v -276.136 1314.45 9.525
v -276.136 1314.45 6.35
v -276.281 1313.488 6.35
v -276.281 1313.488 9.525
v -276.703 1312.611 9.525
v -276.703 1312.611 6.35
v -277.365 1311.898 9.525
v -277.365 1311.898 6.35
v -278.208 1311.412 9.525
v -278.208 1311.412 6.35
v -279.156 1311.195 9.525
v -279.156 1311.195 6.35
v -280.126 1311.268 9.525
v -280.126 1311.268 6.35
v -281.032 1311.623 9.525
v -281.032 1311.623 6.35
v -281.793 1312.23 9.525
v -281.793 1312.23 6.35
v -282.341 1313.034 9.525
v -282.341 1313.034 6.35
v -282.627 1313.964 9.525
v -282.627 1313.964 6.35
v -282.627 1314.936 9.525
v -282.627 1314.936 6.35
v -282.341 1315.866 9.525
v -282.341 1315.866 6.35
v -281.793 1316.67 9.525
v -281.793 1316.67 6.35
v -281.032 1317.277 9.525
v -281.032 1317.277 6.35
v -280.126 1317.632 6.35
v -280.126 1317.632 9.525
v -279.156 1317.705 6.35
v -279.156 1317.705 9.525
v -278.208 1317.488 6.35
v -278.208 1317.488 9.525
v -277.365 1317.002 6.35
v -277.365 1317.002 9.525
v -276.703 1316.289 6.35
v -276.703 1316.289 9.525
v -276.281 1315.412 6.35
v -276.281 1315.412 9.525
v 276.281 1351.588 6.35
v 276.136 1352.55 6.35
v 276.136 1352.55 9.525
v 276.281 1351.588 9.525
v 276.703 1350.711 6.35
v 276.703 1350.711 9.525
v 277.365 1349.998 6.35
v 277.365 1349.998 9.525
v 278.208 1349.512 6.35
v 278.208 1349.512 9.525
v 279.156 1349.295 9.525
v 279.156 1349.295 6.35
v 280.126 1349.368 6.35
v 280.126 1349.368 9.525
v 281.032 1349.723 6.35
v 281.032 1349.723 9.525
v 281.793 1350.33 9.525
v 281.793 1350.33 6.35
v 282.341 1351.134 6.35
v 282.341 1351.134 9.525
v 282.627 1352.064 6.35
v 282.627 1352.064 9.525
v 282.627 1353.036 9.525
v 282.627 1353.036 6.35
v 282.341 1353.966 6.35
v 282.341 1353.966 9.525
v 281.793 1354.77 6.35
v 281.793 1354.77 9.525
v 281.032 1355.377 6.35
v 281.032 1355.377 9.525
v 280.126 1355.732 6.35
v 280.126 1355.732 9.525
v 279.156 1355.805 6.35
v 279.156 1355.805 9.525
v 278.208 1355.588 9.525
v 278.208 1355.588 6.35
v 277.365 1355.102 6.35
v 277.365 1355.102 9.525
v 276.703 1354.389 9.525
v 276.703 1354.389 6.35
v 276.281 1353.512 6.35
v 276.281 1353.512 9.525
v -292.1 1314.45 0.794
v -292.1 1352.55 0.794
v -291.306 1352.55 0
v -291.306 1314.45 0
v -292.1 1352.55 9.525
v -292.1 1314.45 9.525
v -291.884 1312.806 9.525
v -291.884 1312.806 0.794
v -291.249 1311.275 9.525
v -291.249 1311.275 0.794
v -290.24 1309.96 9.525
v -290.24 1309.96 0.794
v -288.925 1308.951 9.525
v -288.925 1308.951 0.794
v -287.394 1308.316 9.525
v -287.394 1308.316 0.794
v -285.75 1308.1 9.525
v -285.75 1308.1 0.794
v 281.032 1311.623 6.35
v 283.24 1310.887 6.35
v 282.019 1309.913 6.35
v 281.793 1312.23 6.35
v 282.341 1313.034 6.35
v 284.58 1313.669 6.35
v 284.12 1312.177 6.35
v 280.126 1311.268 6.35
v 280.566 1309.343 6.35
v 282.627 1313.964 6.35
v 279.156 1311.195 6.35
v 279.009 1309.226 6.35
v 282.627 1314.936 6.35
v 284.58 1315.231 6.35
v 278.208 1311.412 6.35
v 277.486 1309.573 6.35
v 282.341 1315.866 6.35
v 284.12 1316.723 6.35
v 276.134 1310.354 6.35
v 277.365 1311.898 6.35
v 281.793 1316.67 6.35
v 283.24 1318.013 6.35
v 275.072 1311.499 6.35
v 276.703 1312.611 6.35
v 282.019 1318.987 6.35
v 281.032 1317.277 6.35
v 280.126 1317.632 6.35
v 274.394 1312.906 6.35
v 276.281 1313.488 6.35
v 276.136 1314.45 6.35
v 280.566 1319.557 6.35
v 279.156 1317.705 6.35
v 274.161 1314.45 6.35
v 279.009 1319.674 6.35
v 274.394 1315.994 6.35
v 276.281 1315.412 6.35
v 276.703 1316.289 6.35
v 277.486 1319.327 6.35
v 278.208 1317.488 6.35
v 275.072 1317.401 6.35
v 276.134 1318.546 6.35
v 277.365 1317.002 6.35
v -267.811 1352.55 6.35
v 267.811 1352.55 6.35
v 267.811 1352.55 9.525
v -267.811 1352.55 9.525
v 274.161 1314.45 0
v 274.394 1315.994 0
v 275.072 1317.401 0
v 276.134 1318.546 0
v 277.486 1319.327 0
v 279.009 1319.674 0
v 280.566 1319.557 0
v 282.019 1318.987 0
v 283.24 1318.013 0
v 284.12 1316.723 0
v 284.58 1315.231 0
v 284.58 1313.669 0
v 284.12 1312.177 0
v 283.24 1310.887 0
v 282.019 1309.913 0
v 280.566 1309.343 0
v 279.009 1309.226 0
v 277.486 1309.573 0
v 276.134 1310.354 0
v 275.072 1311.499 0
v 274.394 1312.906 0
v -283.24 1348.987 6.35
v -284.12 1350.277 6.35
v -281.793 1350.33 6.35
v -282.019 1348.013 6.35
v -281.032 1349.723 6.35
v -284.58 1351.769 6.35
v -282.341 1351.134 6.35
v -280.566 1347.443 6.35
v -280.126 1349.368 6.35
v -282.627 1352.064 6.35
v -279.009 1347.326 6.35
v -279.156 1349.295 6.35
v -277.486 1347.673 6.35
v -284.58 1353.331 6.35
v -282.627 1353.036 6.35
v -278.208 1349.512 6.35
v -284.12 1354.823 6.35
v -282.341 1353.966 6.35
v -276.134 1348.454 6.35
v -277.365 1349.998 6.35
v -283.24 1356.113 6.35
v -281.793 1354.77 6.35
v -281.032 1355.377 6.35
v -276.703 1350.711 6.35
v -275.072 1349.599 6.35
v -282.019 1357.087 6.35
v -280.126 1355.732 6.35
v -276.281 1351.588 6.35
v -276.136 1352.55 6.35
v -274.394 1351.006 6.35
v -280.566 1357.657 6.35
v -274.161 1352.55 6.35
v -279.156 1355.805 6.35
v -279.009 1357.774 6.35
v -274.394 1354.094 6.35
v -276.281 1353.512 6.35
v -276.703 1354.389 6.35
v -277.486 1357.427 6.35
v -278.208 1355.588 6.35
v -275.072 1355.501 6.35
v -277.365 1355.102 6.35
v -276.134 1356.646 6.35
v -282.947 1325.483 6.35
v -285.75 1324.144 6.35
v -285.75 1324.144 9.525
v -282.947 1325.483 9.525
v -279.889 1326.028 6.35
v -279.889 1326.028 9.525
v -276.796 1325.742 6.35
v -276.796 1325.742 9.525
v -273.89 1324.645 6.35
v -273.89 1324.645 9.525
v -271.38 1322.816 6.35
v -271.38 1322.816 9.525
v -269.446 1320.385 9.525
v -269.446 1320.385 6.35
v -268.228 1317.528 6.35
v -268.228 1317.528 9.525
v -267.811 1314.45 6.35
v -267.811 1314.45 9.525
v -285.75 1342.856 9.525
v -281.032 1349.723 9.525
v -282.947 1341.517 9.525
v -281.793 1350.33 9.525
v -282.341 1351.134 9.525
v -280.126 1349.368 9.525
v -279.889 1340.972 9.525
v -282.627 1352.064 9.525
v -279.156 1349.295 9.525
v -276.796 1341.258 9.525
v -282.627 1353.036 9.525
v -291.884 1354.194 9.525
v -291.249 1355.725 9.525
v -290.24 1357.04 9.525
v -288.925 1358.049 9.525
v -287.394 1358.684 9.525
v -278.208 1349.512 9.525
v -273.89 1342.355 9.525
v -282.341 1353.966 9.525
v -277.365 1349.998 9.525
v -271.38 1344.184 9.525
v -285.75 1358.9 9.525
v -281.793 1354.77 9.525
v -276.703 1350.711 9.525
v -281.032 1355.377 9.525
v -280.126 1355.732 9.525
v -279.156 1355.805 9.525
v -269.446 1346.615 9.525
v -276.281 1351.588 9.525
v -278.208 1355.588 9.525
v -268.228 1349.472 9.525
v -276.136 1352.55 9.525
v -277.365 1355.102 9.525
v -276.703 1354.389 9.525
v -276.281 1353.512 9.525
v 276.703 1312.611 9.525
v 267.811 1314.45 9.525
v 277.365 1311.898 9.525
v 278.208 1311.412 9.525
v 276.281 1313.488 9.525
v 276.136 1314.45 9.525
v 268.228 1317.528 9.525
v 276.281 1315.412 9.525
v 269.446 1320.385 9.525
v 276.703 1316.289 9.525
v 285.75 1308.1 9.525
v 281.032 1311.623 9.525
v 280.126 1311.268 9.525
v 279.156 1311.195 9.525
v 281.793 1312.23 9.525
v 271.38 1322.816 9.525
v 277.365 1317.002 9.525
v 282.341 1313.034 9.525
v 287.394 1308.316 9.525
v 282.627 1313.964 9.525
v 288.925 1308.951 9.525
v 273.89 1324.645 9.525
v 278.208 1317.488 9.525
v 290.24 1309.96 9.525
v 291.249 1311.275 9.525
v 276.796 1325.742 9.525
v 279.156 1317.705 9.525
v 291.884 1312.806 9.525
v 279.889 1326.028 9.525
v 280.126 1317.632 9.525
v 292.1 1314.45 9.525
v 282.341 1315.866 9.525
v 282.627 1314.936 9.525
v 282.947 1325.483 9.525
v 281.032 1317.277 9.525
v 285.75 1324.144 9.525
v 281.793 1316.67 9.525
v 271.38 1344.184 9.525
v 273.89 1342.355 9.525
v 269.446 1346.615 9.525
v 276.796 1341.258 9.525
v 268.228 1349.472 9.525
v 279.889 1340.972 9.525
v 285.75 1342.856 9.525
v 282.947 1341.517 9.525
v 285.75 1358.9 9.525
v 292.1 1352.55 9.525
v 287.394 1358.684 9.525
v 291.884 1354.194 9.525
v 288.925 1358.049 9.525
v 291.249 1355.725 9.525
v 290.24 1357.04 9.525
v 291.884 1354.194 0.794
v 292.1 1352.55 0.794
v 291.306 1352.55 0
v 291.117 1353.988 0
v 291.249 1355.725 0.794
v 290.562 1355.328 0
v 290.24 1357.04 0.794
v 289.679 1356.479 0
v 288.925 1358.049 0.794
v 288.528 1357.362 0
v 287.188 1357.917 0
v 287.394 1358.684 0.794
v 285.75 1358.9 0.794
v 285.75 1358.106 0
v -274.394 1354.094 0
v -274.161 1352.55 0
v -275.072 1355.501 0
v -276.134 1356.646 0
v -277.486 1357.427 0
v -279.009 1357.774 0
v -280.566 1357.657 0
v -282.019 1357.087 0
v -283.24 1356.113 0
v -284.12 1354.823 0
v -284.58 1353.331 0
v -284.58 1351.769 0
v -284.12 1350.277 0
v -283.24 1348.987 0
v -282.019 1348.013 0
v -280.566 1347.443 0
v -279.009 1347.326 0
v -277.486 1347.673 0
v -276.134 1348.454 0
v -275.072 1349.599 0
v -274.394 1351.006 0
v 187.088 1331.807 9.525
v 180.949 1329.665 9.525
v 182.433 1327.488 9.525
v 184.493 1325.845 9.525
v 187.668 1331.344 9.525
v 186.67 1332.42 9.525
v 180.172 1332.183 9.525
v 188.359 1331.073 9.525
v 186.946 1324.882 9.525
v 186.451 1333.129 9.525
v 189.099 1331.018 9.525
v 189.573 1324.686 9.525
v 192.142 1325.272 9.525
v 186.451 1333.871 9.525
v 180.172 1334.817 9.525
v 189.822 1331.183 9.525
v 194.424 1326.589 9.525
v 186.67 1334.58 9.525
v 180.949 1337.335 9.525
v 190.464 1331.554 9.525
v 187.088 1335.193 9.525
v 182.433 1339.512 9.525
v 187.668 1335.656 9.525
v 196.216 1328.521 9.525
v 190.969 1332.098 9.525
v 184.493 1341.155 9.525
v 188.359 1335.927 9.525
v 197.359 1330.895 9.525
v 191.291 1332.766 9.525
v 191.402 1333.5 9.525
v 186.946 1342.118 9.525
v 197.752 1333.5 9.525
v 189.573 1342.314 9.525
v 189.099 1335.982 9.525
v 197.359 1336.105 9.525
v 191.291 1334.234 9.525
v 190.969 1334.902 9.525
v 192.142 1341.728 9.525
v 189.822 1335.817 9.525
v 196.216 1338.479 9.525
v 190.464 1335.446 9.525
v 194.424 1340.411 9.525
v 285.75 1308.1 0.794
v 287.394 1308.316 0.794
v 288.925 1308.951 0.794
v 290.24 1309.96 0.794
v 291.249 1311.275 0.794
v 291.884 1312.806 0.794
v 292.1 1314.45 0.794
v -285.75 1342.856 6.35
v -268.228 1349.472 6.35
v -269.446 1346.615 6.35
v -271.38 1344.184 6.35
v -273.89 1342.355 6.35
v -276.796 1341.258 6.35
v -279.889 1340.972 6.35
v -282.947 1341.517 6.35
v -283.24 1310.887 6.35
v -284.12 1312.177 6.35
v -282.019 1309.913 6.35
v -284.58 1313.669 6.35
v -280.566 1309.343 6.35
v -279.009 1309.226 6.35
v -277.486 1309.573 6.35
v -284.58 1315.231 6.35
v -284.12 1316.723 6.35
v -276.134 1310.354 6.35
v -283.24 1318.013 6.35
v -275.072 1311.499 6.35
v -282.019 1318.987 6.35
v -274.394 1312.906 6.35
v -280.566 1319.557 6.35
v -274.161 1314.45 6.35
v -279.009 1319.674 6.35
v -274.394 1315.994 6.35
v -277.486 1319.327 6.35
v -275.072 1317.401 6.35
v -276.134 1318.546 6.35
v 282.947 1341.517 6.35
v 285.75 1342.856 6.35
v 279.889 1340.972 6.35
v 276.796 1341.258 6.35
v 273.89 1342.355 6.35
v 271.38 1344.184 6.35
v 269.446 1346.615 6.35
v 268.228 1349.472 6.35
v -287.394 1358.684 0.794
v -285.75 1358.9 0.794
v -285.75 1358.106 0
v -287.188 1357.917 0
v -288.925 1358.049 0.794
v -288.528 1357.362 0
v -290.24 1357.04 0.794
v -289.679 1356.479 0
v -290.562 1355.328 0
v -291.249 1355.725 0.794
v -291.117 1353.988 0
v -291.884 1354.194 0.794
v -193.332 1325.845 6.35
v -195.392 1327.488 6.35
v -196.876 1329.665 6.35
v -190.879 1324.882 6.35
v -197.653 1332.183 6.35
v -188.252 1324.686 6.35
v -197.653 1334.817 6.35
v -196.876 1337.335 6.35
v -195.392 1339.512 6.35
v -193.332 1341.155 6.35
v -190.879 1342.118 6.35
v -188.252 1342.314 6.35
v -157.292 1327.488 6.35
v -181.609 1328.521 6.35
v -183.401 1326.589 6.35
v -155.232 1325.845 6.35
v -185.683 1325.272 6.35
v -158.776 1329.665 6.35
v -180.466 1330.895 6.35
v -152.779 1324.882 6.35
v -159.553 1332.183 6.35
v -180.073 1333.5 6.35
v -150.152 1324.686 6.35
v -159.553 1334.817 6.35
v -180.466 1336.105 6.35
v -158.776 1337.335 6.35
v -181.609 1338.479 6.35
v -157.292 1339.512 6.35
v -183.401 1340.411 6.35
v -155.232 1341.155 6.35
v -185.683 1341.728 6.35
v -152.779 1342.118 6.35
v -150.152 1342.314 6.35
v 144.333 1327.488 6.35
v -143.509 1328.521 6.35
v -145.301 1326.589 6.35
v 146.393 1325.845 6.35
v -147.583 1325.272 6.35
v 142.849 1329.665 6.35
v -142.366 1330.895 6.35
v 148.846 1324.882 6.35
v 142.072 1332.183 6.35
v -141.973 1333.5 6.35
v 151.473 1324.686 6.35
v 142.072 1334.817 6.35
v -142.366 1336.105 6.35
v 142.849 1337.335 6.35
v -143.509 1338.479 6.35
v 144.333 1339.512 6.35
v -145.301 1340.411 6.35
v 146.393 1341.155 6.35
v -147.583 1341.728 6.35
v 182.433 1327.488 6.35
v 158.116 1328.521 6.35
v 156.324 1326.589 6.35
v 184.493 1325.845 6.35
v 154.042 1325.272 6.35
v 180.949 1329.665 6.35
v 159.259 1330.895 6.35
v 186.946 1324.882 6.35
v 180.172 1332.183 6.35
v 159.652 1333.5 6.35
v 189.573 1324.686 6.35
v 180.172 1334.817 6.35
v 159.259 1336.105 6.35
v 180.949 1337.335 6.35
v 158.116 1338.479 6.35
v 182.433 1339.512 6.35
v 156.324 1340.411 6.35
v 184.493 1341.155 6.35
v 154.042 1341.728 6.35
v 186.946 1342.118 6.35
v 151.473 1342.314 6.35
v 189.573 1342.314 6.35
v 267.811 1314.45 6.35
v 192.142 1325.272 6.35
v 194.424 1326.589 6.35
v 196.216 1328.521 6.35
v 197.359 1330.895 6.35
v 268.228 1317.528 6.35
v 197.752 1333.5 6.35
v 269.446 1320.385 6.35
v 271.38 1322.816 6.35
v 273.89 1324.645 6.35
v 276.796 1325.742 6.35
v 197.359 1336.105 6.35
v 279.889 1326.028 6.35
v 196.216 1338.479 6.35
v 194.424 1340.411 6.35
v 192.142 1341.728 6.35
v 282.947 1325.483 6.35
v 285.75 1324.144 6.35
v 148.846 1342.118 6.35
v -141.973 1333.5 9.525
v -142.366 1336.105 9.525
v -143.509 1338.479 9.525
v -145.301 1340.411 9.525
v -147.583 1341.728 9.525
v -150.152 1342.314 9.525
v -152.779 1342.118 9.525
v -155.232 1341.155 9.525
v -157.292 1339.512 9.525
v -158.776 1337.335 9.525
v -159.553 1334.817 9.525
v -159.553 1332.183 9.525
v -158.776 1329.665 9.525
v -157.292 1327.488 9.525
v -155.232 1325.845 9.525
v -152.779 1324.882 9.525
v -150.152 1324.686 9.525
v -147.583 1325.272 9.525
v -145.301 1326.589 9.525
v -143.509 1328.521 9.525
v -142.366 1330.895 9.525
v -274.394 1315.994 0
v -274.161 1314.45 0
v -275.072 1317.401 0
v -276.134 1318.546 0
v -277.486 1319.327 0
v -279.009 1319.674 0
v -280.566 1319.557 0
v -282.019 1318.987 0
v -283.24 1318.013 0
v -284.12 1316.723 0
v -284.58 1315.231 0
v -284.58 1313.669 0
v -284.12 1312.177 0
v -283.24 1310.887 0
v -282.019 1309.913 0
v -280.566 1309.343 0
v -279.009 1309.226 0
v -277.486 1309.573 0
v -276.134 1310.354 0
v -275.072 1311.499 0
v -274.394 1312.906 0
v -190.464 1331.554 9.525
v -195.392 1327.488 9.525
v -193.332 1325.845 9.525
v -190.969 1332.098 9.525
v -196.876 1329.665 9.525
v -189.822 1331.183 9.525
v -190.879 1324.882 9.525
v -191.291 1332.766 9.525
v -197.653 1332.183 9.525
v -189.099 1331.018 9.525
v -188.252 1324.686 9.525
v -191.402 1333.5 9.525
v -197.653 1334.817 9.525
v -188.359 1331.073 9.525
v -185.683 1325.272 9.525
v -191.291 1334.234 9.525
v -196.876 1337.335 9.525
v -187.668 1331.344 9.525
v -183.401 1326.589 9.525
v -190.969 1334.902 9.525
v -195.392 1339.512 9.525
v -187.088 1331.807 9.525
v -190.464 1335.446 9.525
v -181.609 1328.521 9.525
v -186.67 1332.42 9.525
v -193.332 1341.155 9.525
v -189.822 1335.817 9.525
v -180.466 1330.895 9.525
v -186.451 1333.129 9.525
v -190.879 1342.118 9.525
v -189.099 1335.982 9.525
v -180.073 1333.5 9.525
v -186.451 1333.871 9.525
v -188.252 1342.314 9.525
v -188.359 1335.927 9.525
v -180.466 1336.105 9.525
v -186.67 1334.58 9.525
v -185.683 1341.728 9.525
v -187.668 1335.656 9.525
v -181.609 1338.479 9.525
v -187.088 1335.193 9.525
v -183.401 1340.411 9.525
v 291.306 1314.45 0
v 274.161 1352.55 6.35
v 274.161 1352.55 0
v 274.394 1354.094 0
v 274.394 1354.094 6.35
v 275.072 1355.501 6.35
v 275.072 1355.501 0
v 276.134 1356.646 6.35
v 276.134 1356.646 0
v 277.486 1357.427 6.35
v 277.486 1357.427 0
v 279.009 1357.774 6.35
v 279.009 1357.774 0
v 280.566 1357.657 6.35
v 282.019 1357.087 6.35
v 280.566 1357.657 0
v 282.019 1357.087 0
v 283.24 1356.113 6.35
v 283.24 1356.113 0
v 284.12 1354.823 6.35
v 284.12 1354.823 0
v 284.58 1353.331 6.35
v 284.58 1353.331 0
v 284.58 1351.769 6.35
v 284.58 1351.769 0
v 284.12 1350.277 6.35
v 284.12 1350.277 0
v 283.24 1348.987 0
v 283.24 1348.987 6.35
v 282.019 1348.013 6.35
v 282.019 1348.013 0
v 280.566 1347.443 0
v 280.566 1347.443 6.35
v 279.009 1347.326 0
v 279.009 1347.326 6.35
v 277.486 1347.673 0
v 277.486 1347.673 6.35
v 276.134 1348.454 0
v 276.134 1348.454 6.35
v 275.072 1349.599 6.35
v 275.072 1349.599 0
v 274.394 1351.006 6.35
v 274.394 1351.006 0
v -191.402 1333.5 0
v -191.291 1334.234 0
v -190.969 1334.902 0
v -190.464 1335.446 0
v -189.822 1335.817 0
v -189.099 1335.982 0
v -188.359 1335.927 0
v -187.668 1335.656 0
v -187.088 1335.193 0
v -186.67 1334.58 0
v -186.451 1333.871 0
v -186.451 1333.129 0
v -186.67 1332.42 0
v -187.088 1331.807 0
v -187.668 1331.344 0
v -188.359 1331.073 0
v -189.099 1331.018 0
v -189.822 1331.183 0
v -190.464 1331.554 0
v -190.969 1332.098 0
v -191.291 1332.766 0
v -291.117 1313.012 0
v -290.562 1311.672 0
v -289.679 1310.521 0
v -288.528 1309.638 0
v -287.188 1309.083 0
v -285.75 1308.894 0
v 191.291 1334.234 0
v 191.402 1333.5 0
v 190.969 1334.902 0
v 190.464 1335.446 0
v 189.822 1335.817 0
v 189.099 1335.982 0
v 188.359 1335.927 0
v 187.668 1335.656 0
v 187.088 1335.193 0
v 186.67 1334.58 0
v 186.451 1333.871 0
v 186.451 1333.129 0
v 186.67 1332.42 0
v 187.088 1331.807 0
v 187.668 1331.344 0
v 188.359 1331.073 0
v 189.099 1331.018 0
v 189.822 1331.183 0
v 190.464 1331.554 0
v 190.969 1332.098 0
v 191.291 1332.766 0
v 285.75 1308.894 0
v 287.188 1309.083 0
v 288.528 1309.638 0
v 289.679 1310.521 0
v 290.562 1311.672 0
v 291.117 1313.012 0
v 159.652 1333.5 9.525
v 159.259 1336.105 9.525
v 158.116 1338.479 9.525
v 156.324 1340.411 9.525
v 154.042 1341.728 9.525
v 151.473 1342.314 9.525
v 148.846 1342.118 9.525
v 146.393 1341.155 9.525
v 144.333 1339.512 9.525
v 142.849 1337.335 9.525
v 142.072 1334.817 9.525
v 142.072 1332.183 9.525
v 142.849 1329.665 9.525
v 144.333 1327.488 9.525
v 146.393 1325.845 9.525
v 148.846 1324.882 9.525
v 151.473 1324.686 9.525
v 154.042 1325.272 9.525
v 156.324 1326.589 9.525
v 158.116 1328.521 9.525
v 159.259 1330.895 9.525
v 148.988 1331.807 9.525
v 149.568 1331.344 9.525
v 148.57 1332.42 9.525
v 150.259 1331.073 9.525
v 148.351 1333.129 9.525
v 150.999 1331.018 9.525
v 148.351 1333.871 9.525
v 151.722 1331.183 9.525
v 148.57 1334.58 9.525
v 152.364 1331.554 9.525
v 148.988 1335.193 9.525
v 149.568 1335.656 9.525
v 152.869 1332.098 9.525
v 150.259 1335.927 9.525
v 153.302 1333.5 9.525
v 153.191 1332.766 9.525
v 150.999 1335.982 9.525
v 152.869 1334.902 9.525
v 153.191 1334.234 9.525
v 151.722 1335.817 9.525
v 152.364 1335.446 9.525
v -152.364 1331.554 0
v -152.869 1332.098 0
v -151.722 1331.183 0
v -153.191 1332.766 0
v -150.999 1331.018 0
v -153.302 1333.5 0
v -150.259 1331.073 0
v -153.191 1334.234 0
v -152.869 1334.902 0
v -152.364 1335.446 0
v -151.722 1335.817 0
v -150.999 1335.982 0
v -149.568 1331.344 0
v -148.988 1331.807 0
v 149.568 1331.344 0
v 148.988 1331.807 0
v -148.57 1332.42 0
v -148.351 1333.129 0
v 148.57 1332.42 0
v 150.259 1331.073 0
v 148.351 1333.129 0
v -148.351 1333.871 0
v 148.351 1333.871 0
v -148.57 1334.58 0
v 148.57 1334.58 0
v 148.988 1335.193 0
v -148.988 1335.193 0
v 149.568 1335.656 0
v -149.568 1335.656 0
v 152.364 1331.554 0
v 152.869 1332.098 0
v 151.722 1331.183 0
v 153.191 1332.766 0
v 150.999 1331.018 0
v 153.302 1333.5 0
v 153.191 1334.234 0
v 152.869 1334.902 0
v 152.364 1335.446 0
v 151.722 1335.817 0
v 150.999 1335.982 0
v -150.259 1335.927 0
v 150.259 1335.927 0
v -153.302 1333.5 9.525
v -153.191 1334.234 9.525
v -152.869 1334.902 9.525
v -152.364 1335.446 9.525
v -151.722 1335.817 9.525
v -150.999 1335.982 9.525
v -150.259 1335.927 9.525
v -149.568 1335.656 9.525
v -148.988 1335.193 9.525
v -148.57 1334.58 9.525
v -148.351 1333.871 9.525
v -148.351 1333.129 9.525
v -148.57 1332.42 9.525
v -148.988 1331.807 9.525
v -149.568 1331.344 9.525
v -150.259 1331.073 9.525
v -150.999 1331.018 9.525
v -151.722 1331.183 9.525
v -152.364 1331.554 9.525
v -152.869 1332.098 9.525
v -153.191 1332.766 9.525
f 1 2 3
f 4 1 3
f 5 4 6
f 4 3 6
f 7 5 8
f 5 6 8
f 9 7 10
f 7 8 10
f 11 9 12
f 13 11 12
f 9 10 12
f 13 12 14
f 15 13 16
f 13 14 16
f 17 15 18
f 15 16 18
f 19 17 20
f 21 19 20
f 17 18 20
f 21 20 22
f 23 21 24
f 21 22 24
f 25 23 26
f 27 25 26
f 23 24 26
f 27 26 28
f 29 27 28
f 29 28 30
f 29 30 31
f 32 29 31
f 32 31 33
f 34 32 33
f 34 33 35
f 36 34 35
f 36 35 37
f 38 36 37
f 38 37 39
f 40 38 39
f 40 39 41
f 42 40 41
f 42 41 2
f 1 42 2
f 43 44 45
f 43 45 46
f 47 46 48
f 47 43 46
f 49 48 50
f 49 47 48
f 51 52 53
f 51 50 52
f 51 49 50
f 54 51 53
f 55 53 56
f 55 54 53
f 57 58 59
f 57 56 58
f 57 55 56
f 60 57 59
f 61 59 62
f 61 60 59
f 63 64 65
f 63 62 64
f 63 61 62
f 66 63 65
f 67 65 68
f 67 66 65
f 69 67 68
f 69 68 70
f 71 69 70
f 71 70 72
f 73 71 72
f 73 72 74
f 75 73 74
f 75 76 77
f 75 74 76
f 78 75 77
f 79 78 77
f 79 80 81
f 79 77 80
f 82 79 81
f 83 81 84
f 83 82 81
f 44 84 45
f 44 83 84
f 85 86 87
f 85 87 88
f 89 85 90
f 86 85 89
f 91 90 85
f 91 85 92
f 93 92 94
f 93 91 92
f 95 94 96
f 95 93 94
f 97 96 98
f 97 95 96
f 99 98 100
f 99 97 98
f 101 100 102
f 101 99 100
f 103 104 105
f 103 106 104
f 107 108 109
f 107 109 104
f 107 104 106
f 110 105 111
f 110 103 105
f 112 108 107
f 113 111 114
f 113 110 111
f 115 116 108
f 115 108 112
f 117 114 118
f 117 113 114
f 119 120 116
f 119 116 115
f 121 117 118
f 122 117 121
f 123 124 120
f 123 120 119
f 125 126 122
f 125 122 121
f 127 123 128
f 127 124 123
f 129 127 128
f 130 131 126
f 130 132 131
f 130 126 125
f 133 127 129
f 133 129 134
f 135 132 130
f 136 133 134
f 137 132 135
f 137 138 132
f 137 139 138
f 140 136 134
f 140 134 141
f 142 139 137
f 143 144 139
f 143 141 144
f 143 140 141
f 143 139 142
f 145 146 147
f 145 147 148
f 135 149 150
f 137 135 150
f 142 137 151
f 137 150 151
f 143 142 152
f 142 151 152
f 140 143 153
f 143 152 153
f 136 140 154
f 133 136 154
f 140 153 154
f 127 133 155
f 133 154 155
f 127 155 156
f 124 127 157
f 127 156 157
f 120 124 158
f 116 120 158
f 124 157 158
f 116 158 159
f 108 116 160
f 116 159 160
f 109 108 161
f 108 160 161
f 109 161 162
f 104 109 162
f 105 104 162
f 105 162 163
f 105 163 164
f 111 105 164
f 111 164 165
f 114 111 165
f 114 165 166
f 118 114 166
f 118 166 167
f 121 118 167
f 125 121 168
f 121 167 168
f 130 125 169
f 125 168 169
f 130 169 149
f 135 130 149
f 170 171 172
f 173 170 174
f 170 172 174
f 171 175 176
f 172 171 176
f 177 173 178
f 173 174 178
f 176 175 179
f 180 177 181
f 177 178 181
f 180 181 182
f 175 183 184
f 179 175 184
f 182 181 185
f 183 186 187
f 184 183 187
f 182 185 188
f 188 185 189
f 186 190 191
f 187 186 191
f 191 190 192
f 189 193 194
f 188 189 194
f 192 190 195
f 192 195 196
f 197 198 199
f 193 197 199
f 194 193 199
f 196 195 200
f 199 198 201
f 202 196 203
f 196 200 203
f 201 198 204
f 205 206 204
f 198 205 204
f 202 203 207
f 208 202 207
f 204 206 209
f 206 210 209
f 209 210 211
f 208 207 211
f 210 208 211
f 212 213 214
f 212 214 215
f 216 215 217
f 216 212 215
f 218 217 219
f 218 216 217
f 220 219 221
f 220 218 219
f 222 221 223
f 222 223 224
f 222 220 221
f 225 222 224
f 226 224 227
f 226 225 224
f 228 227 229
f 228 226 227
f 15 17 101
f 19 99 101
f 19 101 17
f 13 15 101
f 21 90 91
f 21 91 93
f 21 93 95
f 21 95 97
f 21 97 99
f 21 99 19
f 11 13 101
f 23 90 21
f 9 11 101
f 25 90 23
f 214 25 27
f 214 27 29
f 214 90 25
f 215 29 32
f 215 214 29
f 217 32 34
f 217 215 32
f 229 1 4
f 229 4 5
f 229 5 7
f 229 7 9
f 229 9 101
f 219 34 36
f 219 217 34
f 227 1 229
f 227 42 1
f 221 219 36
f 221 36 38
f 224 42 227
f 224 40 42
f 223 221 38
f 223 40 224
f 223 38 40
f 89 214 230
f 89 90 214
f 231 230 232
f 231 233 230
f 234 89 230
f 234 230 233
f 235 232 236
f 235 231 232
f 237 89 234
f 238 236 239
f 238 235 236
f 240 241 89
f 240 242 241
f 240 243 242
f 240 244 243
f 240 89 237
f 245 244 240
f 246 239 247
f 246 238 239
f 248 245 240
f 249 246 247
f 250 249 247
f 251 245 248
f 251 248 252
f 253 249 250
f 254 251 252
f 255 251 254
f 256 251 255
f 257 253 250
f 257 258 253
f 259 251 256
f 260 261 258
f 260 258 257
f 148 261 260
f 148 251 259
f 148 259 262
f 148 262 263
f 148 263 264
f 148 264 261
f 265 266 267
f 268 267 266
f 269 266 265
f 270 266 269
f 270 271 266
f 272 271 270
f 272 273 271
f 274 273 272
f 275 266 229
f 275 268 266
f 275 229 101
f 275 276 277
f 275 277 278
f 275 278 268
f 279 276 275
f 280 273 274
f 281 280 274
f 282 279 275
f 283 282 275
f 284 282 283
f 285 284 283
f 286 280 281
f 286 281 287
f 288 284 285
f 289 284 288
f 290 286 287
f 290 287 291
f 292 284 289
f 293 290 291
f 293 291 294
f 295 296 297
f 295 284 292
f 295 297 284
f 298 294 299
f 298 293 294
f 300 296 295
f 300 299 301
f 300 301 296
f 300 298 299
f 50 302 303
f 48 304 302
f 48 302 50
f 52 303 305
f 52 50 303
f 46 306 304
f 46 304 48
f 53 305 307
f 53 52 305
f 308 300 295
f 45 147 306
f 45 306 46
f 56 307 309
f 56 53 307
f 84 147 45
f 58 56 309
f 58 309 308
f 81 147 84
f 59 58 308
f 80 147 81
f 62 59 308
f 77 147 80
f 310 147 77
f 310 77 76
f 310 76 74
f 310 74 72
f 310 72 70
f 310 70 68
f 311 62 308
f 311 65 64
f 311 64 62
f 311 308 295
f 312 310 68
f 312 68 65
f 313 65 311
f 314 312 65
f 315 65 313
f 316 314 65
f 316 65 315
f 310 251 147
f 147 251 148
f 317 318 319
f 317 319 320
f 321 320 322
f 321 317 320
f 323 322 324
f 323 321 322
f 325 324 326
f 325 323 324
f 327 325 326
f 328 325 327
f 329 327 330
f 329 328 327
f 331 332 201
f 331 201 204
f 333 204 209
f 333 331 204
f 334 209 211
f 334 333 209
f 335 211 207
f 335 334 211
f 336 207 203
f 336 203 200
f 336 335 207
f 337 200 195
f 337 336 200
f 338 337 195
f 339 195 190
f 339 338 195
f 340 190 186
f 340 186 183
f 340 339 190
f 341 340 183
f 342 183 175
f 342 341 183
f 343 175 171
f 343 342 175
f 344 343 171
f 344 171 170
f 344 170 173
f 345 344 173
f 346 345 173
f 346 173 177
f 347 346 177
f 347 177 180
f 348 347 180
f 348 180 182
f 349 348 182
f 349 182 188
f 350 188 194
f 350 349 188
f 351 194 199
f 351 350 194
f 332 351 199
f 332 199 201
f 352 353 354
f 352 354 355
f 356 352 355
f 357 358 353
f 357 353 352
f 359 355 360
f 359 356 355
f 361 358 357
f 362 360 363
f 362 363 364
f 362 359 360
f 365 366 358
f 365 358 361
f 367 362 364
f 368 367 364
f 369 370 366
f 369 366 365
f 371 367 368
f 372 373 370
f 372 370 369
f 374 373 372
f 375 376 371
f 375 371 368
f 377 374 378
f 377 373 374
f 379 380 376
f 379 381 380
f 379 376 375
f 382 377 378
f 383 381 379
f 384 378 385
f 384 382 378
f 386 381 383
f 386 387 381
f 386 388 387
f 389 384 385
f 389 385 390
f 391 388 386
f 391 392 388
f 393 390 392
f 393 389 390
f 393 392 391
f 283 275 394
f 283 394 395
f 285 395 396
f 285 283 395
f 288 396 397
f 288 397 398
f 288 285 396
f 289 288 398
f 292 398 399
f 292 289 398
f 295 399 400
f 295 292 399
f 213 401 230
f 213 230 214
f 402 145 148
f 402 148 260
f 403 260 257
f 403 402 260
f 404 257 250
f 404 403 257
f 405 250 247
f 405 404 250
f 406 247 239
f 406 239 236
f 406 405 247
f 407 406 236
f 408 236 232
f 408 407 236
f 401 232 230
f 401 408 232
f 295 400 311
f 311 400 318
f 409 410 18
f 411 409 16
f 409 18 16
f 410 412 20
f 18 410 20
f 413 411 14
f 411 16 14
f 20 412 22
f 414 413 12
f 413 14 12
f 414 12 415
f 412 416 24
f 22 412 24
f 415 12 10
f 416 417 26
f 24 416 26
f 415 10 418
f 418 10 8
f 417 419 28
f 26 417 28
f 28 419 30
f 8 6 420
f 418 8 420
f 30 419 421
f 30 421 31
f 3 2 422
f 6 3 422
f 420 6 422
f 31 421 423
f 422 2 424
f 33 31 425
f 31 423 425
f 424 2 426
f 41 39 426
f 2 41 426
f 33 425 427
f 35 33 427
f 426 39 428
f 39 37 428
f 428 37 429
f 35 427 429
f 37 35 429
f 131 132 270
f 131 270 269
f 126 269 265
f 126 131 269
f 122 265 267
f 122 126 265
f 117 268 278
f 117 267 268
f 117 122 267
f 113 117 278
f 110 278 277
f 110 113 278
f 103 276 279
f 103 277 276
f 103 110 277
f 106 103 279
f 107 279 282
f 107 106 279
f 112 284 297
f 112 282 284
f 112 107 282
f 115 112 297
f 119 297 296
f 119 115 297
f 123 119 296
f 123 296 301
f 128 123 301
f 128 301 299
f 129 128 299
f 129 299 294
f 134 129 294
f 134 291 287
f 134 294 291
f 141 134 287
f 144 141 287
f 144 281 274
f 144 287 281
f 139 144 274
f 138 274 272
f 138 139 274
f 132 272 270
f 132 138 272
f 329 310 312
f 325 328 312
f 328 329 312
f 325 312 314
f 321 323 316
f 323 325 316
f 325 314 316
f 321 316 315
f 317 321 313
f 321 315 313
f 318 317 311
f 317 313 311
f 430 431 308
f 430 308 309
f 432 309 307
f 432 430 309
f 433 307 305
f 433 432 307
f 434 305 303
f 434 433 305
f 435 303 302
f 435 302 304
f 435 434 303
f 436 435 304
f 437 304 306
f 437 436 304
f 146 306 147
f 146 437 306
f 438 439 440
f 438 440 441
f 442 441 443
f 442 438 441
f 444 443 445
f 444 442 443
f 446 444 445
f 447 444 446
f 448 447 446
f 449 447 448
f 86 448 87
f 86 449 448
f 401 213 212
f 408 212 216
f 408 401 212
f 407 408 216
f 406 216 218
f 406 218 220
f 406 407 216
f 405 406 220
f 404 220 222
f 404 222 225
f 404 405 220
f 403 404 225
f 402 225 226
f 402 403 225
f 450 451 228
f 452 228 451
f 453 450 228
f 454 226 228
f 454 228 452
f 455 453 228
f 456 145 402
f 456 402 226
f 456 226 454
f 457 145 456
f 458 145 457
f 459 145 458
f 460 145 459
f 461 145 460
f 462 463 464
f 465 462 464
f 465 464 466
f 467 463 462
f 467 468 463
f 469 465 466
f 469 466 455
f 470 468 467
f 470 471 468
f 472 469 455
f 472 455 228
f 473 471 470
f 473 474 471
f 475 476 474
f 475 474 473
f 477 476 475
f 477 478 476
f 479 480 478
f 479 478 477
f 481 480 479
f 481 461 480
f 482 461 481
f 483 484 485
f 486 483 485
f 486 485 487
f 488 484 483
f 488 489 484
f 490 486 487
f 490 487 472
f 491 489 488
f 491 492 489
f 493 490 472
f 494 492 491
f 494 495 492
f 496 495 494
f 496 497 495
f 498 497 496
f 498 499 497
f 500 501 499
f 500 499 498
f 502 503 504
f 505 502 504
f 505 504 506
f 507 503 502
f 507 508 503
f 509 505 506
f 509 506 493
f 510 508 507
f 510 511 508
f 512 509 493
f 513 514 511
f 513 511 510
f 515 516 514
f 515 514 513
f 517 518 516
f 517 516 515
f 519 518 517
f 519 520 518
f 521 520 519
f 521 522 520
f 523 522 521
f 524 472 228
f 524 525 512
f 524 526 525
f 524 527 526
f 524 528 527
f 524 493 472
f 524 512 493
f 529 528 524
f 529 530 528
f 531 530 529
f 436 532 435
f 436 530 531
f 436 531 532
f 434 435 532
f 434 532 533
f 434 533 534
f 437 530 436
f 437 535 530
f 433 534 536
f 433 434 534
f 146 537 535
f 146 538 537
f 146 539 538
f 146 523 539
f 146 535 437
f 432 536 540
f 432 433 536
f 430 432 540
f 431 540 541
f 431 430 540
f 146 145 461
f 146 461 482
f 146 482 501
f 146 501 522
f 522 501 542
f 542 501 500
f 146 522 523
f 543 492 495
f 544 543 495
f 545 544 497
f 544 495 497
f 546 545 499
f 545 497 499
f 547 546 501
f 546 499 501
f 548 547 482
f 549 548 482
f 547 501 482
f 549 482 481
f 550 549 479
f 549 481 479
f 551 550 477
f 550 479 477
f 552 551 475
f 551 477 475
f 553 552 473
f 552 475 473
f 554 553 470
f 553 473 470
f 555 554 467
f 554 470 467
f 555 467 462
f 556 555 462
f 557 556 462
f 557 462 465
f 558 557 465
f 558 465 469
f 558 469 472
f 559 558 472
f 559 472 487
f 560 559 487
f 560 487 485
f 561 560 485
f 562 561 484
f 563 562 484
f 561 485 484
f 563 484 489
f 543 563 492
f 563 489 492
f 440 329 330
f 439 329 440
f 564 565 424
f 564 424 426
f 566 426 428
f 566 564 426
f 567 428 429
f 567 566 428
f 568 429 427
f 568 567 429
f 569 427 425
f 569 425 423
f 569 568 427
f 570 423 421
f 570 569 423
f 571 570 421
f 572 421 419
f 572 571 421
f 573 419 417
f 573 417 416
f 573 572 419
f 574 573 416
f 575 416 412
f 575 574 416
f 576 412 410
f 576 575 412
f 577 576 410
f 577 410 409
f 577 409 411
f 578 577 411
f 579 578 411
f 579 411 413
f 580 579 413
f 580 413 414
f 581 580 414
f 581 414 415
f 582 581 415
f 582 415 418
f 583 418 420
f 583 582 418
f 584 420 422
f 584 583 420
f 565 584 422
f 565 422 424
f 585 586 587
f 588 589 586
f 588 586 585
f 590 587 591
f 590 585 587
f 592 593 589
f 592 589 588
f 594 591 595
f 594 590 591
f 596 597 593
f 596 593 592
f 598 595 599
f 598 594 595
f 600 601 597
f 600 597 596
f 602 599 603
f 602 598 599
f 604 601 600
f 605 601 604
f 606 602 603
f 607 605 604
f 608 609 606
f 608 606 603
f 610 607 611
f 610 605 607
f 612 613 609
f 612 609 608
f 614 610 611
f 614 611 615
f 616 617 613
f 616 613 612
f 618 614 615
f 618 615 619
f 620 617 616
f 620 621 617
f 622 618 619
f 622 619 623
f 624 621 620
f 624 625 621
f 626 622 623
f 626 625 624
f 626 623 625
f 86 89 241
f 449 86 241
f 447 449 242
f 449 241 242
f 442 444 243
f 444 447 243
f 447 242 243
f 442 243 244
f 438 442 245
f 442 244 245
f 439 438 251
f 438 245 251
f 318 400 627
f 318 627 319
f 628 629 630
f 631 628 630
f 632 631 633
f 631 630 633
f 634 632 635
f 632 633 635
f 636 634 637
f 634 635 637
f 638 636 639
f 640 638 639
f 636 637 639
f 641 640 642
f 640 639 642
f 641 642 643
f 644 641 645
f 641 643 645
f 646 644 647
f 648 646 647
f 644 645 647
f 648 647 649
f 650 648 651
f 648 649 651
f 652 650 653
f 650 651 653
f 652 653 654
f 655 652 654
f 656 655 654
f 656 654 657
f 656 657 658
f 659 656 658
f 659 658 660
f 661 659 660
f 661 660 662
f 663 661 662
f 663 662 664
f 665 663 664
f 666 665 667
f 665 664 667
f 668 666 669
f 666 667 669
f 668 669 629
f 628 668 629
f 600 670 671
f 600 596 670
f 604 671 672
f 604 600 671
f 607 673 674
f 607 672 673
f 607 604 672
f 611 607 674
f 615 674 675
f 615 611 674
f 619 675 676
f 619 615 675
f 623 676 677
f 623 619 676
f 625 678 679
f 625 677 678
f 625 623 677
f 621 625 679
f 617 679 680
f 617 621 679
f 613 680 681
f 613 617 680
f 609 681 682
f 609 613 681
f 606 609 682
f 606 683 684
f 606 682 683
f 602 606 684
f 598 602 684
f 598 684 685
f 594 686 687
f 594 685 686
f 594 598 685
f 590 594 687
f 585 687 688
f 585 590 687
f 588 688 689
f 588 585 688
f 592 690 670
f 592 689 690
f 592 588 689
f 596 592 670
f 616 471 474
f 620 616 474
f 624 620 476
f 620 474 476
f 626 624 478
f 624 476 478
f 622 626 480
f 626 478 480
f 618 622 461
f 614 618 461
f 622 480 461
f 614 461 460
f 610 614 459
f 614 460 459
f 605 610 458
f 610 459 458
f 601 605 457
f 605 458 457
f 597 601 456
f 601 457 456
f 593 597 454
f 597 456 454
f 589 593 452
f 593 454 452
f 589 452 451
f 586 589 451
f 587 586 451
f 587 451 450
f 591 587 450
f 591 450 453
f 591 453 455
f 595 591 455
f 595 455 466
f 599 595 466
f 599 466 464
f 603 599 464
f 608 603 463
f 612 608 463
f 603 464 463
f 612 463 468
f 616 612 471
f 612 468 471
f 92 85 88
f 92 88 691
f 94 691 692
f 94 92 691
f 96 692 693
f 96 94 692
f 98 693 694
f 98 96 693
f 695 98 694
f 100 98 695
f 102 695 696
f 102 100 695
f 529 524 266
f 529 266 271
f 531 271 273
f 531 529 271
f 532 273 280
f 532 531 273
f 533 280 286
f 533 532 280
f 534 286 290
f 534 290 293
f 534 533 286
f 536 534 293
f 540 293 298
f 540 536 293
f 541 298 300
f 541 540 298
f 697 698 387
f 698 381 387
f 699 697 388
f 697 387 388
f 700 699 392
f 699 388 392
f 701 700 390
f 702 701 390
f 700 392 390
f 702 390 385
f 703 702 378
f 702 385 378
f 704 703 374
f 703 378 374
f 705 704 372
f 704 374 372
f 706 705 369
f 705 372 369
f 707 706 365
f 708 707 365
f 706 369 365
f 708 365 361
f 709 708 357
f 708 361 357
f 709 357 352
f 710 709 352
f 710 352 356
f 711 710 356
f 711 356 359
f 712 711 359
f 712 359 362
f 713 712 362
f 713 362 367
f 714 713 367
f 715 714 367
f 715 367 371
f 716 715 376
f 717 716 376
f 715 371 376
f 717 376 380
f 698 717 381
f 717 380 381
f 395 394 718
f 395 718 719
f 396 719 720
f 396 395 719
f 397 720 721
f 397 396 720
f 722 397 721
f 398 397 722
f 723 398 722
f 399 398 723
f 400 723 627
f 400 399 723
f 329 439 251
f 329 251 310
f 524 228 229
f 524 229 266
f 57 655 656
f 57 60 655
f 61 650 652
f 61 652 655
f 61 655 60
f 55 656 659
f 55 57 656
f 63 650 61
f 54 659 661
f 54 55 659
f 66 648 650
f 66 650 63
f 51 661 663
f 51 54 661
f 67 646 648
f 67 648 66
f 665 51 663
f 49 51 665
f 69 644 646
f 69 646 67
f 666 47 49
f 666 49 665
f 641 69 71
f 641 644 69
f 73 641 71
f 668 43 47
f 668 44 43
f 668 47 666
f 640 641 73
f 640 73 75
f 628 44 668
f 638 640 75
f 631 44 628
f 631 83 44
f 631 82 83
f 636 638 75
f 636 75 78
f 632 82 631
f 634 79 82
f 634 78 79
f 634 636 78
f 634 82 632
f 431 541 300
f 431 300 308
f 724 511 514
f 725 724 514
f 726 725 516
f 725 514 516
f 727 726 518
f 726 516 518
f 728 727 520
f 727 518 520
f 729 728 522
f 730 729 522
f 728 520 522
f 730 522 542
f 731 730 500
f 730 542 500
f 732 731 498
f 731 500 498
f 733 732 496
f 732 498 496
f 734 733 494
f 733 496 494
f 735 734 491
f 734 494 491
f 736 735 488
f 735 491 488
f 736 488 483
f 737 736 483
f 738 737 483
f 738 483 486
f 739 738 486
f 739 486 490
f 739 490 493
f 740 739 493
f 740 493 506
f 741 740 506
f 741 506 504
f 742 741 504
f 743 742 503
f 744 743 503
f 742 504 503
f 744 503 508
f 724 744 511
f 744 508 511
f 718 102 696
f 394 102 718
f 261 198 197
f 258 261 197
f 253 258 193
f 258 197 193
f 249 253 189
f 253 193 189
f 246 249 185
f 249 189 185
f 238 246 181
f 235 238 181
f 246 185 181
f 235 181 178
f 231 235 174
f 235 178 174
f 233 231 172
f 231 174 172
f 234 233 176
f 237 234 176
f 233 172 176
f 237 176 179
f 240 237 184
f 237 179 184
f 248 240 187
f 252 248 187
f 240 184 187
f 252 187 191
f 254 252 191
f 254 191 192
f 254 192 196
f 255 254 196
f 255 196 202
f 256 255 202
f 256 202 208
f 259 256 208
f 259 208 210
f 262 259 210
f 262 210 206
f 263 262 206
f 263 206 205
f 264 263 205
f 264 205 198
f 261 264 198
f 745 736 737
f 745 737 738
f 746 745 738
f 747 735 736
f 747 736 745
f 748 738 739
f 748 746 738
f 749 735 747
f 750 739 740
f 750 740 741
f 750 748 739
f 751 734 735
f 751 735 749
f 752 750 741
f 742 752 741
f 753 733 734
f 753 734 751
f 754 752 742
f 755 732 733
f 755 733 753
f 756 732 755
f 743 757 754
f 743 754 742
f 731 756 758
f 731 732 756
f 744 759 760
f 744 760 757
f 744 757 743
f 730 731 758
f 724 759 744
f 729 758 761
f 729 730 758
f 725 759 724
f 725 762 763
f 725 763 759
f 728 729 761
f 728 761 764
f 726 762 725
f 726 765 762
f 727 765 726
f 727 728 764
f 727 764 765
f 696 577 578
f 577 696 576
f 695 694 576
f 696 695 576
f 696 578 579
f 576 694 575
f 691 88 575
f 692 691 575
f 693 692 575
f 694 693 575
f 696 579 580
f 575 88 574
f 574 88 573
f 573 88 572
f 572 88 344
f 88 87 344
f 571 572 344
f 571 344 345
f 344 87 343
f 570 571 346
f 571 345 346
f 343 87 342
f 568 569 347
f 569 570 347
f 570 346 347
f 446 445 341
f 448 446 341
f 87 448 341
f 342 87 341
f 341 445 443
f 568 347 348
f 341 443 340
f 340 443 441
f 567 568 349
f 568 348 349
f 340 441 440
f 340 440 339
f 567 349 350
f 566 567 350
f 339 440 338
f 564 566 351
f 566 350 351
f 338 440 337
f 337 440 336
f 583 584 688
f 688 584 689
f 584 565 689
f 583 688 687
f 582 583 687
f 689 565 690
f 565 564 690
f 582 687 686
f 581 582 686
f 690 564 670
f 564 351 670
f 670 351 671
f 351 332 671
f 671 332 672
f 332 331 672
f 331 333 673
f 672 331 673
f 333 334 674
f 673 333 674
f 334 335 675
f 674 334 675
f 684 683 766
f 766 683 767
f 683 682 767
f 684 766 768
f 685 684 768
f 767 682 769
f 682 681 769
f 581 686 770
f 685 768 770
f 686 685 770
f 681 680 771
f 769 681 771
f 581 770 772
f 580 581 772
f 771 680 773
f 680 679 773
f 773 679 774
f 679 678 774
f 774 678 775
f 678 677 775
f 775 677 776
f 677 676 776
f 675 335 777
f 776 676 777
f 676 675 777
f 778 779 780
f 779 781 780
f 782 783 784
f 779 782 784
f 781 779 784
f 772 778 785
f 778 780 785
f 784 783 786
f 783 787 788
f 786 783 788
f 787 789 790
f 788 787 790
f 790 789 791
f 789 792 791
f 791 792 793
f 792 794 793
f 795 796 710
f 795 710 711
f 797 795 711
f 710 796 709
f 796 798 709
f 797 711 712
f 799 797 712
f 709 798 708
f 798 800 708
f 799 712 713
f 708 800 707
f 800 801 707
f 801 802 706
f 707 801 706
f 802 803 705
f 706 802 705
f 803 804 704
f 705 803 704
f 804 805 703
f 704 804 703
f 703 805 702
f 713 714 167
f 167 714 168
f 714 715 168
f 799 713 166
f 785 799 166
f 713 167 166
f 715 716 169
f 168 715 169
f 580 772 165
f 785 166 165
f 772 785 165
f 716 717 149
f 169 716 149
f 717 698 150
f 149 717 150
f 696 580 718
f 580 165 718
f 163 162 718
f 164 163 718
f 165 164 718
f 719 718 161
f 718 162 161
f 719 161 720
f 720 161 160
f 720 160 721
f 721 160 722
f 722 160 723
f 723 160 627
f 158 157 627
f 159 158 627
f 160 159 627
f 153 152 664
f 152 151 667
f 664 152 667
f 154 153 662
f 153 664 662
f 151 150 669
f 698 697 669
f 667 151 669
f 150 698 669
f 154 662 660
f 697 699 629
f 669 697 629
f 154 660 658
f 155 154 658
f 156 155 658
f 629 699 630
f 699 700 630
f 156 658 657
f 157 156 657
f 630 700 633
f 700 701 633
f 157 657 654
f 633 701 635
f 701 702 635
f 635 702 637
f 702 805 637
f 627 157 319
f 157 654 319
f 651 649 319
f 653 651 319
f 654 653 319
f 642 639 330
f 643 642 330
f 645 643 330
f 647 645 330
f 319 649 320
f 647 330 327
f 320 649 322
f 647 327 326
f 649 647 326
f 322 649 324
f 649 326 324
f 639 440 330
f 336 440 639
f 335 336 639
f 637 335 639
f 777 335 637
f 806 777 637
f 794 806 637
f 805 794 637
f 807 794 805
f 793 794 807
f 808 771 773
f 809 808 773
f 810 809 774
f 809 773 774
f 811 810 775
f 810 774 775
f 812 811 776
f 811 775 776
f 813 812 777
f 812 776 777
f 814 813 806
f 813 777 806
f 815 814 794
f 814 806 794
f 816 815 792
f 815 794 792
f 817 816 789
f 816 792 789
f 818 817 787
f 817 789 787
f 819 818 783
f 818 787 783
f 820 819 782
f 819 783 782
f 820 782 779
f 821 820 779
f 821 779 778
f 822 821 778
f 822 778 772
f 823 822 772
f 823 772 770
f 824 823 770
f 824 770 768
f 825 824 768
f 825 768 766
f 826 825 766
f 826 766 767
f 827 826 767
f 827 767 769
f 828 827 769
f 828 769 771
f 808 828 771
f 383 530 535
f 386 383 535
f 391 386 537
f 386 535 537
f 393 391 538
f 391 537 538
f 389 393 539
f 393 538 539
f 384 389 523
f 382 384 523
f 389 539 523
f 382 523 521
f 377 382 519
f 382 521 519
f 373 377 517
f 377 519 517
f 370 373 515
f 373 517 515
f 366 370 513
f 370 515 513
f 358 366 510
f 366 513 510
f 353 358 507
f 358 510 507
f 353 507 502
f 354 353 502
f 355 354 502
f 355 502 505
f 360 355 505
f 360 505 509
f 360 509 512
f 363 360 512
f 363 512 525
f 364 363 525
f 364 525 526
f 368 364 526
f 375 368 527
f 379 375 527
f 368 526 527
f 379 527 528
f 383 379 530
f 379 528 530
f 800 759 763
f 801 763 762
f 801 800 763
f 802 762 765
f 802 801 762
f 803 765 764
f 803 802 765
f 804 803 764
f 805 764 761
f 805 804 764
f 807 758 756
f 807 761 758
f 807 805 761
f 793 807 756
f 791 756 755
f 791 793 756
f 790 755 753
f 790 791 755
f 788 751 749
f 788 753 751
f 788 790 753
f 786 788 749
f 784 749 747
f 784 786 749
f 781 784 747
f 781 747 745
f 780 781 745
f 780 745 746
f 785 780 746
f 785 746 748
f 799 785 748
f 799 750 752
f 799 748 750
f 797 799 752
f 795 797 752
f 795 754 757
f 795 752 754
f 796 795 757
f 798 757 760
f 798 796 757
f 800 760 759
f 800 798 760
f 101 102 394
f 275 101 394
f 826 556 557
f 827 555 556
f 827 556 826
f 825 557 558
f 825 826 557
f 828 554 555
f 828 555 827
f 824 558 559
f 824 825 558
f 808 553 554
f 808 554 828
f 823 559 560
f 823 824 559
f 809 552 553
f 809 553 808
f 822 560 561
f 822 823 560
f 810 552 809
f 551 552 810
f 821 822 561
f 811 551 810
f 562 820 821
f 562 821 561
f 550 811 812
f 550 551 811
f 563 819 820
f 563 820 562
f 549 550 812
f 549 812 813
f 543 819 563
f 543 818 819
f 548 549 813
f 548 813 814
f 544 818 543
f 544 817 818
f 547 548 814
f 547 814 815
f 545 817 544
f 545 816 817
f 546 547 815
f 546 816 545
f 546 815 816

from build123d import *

# Parameters (mm, degrees)
SKETCH1_W           = 584.2
SKETCH1_H           = 50.8
BOSS_EXTRUDE1_DEPTH = 9.525
SKETCH2_R           = 3.2639
CUT_EXTRUDE2_DEPTH  = 1390.972066491
SKETCH3_R           = 5.23875
CUT_EXTRUDE3_DEPTH  = 6.35
FILLET1_R           = 6.35
SKETCH4_R           = 2.4892
CUT_EXTRUDE4_DEPTH  = 1390.972066491
CHAMFER1_SIZE       = 0.79375
SHELL1_START        = 6.35
SHELL1_OUTLINE_R    = 8.8392
SHELL1_DEPTH        = 3.175


# Read off the part's stored shape, not the designer's step: Shell1
with BuildPart() as part:
    # Sketch1 → Boss-Extrude1 (new body)
    with BuildSketch(Plane.XY):
        with Locations((0, 1333.5)):
            Rectangle(SKETCH1_W, SKETCH1_H)
    extrude(amount=BOSS_EXTRUDE1_DEPTH)

    # Sketch2 → Cut-Extrude2 (cut, through all)
    with BuildSketch(Plane.XY):
        with Locations(Location((279.4, 1314.45, 0), (0, 0, 180))):
            Circle(SKETCH2_R)
        with Locations(Location((279.4, 1352.55, 0), (0, 0, 180))):
            Circle(SKETCH2_R)
    cut_extrude2 = extrude(amount=CUT_EXTRUDE2_DEPTH, mode=Mode.SUBTRACT)

    # Sketch3 → Cut-Extrude3 (cut)
    with BuildSketch(Plane(origin=(0, 0, 0), x_dir=(-1, 0, 0), z_dir=(0, 0, -1))):
        with Locations((-279.4, 1314.45)):
            Circle(SKETCH3_R)
        with Locations((-279.4, 1352.55)):
            Circle(SKETCH3_R)
    cut_extrude3 = extrude(amount=-CUT_EXTRUDE3_DEPTH, mode=Mode.SUBTRACT)

    # Fillet1
    fillet1_edges = [part.edges().sort_by_distance(p)[0] for p in [
        (292.1, 1308.1, 4.7625),
        (-292.1, 1308.1, 4.7625),
        (-292.1, 1358.9, 4.7625),
        (292.1, 1358.9, 4.7625),
    ]]
    fillet(fillet1_edges, radius=FILLET1_R)

    # Sketch4 → Cut-Extrude4 (cut, symmetric)
    with BuildSketch(Plane.XY):
        with Locations((150.8125, 1333.5)):
            Circle(SKETCH4_R)
        with Locations((188.9125, 1333.5)):
            Circle(SKETCH4_R)
    cut_extrude4 = extrude(amount=CUT_EXTRUDE4_DEPTH, both=True, mode=Mode.SUBTRACT)

    # Mirror2: Cut-Extrude2, Cut-Extrude3, Cut-Extrude4 across plane
    add(cut_extrude2.mirror(Plane(origin=(0, 0, 0), x_dir=(0, 0, 1), z_dir=(1, 0, 0))), mode=Mode.SUBTRACT)
    add(cut_extrude3.mirror(Plane(origin=(0, 0, 0), x_dir=(0, 0, 1), z_dir=(1, 0, 0))), mode=Mode.SUBTRACT)
    add(cut_extrude4.mirror(Plane(origin=(0, 0, 0), x_dir=(0, 0, 1), z_dir=(1, 0, 0))), mode=Mode.SUBTRACT)

    # Chamfer1
    chamfer1_edges = [part.edges().sort_by_distance(p)[0] for p in [
        (0, 1308.1, 0),
        (292.1, 1333.5, 0),
        (-292.1, 1333.5, 0),
        (0, 1358.9, 0),
        (290.240128061, 1357.040128061, 0),
        (290.240128061, 1309.959871939, 0),
        (-290.240128061, 1357.040128061, 0),
        (-290.240128061, 1309.959871939, 0),
    ]]
    chamfer(chamfer1_edges, length=CHAMFER1_SIZE)

    # Shell1 outline → Shell1 (cut)
    with BuildSketch(Plane.XY.offset(SHELL1_START)):
        with BuildLine():
            Line((285.75, 1324.144154247), (285.75, 1342.855845753))
            ThreePointArc((285.75, 1342.855845753), (273.89043722, 1342.354714593), (267.81125, 1352.55))
            Line((267.81125, 1352.55), (-267.81125, 1352.55))
            ThreePointArc((-267.81125, 1352.55), (-273.89043722, 1342.354714593), (-285.75, 1342.855845753))
            Line((-285.75, 1342.855845753), (-285.75, 1324.144154247))
            ThreePointArc((-285.75, 1324.144154247), (-273.89043722, 1324.645285407), (-267.81125, 1314.45))
            Line((-267.81125, 1314.45), (267.81125, 1314.45))
            ThreePointArc((267.81125, 1314.45), (273.89043722, 1324.645285407), (285.75, 1324.144154247))
        make_face()
        with Locations((-188.9125, 1333.5)):
            Circle(SHELL1_OUTLINE_R, mode=Mode.SUBTRACT)
        with Locations((-150.8125, 1333.5)):
            Circle(SHELL1_OUTLINE_R, mode=Mode.SUBTRACT)
        with Locations((150.8125, 1333.5)):
            Circle(SHELL1_OUTLINE_R, mode=Mode.SUBTRACT)
        with Locations((188.9125, 1333.5)):
            Circle(SHELL1_OUTLINE_R, mode=Mode.SUBTRACT)
    extrude(amount=SHELL1_DEPTH, mode=Mode.SUBTRACT)


solid = part.part
